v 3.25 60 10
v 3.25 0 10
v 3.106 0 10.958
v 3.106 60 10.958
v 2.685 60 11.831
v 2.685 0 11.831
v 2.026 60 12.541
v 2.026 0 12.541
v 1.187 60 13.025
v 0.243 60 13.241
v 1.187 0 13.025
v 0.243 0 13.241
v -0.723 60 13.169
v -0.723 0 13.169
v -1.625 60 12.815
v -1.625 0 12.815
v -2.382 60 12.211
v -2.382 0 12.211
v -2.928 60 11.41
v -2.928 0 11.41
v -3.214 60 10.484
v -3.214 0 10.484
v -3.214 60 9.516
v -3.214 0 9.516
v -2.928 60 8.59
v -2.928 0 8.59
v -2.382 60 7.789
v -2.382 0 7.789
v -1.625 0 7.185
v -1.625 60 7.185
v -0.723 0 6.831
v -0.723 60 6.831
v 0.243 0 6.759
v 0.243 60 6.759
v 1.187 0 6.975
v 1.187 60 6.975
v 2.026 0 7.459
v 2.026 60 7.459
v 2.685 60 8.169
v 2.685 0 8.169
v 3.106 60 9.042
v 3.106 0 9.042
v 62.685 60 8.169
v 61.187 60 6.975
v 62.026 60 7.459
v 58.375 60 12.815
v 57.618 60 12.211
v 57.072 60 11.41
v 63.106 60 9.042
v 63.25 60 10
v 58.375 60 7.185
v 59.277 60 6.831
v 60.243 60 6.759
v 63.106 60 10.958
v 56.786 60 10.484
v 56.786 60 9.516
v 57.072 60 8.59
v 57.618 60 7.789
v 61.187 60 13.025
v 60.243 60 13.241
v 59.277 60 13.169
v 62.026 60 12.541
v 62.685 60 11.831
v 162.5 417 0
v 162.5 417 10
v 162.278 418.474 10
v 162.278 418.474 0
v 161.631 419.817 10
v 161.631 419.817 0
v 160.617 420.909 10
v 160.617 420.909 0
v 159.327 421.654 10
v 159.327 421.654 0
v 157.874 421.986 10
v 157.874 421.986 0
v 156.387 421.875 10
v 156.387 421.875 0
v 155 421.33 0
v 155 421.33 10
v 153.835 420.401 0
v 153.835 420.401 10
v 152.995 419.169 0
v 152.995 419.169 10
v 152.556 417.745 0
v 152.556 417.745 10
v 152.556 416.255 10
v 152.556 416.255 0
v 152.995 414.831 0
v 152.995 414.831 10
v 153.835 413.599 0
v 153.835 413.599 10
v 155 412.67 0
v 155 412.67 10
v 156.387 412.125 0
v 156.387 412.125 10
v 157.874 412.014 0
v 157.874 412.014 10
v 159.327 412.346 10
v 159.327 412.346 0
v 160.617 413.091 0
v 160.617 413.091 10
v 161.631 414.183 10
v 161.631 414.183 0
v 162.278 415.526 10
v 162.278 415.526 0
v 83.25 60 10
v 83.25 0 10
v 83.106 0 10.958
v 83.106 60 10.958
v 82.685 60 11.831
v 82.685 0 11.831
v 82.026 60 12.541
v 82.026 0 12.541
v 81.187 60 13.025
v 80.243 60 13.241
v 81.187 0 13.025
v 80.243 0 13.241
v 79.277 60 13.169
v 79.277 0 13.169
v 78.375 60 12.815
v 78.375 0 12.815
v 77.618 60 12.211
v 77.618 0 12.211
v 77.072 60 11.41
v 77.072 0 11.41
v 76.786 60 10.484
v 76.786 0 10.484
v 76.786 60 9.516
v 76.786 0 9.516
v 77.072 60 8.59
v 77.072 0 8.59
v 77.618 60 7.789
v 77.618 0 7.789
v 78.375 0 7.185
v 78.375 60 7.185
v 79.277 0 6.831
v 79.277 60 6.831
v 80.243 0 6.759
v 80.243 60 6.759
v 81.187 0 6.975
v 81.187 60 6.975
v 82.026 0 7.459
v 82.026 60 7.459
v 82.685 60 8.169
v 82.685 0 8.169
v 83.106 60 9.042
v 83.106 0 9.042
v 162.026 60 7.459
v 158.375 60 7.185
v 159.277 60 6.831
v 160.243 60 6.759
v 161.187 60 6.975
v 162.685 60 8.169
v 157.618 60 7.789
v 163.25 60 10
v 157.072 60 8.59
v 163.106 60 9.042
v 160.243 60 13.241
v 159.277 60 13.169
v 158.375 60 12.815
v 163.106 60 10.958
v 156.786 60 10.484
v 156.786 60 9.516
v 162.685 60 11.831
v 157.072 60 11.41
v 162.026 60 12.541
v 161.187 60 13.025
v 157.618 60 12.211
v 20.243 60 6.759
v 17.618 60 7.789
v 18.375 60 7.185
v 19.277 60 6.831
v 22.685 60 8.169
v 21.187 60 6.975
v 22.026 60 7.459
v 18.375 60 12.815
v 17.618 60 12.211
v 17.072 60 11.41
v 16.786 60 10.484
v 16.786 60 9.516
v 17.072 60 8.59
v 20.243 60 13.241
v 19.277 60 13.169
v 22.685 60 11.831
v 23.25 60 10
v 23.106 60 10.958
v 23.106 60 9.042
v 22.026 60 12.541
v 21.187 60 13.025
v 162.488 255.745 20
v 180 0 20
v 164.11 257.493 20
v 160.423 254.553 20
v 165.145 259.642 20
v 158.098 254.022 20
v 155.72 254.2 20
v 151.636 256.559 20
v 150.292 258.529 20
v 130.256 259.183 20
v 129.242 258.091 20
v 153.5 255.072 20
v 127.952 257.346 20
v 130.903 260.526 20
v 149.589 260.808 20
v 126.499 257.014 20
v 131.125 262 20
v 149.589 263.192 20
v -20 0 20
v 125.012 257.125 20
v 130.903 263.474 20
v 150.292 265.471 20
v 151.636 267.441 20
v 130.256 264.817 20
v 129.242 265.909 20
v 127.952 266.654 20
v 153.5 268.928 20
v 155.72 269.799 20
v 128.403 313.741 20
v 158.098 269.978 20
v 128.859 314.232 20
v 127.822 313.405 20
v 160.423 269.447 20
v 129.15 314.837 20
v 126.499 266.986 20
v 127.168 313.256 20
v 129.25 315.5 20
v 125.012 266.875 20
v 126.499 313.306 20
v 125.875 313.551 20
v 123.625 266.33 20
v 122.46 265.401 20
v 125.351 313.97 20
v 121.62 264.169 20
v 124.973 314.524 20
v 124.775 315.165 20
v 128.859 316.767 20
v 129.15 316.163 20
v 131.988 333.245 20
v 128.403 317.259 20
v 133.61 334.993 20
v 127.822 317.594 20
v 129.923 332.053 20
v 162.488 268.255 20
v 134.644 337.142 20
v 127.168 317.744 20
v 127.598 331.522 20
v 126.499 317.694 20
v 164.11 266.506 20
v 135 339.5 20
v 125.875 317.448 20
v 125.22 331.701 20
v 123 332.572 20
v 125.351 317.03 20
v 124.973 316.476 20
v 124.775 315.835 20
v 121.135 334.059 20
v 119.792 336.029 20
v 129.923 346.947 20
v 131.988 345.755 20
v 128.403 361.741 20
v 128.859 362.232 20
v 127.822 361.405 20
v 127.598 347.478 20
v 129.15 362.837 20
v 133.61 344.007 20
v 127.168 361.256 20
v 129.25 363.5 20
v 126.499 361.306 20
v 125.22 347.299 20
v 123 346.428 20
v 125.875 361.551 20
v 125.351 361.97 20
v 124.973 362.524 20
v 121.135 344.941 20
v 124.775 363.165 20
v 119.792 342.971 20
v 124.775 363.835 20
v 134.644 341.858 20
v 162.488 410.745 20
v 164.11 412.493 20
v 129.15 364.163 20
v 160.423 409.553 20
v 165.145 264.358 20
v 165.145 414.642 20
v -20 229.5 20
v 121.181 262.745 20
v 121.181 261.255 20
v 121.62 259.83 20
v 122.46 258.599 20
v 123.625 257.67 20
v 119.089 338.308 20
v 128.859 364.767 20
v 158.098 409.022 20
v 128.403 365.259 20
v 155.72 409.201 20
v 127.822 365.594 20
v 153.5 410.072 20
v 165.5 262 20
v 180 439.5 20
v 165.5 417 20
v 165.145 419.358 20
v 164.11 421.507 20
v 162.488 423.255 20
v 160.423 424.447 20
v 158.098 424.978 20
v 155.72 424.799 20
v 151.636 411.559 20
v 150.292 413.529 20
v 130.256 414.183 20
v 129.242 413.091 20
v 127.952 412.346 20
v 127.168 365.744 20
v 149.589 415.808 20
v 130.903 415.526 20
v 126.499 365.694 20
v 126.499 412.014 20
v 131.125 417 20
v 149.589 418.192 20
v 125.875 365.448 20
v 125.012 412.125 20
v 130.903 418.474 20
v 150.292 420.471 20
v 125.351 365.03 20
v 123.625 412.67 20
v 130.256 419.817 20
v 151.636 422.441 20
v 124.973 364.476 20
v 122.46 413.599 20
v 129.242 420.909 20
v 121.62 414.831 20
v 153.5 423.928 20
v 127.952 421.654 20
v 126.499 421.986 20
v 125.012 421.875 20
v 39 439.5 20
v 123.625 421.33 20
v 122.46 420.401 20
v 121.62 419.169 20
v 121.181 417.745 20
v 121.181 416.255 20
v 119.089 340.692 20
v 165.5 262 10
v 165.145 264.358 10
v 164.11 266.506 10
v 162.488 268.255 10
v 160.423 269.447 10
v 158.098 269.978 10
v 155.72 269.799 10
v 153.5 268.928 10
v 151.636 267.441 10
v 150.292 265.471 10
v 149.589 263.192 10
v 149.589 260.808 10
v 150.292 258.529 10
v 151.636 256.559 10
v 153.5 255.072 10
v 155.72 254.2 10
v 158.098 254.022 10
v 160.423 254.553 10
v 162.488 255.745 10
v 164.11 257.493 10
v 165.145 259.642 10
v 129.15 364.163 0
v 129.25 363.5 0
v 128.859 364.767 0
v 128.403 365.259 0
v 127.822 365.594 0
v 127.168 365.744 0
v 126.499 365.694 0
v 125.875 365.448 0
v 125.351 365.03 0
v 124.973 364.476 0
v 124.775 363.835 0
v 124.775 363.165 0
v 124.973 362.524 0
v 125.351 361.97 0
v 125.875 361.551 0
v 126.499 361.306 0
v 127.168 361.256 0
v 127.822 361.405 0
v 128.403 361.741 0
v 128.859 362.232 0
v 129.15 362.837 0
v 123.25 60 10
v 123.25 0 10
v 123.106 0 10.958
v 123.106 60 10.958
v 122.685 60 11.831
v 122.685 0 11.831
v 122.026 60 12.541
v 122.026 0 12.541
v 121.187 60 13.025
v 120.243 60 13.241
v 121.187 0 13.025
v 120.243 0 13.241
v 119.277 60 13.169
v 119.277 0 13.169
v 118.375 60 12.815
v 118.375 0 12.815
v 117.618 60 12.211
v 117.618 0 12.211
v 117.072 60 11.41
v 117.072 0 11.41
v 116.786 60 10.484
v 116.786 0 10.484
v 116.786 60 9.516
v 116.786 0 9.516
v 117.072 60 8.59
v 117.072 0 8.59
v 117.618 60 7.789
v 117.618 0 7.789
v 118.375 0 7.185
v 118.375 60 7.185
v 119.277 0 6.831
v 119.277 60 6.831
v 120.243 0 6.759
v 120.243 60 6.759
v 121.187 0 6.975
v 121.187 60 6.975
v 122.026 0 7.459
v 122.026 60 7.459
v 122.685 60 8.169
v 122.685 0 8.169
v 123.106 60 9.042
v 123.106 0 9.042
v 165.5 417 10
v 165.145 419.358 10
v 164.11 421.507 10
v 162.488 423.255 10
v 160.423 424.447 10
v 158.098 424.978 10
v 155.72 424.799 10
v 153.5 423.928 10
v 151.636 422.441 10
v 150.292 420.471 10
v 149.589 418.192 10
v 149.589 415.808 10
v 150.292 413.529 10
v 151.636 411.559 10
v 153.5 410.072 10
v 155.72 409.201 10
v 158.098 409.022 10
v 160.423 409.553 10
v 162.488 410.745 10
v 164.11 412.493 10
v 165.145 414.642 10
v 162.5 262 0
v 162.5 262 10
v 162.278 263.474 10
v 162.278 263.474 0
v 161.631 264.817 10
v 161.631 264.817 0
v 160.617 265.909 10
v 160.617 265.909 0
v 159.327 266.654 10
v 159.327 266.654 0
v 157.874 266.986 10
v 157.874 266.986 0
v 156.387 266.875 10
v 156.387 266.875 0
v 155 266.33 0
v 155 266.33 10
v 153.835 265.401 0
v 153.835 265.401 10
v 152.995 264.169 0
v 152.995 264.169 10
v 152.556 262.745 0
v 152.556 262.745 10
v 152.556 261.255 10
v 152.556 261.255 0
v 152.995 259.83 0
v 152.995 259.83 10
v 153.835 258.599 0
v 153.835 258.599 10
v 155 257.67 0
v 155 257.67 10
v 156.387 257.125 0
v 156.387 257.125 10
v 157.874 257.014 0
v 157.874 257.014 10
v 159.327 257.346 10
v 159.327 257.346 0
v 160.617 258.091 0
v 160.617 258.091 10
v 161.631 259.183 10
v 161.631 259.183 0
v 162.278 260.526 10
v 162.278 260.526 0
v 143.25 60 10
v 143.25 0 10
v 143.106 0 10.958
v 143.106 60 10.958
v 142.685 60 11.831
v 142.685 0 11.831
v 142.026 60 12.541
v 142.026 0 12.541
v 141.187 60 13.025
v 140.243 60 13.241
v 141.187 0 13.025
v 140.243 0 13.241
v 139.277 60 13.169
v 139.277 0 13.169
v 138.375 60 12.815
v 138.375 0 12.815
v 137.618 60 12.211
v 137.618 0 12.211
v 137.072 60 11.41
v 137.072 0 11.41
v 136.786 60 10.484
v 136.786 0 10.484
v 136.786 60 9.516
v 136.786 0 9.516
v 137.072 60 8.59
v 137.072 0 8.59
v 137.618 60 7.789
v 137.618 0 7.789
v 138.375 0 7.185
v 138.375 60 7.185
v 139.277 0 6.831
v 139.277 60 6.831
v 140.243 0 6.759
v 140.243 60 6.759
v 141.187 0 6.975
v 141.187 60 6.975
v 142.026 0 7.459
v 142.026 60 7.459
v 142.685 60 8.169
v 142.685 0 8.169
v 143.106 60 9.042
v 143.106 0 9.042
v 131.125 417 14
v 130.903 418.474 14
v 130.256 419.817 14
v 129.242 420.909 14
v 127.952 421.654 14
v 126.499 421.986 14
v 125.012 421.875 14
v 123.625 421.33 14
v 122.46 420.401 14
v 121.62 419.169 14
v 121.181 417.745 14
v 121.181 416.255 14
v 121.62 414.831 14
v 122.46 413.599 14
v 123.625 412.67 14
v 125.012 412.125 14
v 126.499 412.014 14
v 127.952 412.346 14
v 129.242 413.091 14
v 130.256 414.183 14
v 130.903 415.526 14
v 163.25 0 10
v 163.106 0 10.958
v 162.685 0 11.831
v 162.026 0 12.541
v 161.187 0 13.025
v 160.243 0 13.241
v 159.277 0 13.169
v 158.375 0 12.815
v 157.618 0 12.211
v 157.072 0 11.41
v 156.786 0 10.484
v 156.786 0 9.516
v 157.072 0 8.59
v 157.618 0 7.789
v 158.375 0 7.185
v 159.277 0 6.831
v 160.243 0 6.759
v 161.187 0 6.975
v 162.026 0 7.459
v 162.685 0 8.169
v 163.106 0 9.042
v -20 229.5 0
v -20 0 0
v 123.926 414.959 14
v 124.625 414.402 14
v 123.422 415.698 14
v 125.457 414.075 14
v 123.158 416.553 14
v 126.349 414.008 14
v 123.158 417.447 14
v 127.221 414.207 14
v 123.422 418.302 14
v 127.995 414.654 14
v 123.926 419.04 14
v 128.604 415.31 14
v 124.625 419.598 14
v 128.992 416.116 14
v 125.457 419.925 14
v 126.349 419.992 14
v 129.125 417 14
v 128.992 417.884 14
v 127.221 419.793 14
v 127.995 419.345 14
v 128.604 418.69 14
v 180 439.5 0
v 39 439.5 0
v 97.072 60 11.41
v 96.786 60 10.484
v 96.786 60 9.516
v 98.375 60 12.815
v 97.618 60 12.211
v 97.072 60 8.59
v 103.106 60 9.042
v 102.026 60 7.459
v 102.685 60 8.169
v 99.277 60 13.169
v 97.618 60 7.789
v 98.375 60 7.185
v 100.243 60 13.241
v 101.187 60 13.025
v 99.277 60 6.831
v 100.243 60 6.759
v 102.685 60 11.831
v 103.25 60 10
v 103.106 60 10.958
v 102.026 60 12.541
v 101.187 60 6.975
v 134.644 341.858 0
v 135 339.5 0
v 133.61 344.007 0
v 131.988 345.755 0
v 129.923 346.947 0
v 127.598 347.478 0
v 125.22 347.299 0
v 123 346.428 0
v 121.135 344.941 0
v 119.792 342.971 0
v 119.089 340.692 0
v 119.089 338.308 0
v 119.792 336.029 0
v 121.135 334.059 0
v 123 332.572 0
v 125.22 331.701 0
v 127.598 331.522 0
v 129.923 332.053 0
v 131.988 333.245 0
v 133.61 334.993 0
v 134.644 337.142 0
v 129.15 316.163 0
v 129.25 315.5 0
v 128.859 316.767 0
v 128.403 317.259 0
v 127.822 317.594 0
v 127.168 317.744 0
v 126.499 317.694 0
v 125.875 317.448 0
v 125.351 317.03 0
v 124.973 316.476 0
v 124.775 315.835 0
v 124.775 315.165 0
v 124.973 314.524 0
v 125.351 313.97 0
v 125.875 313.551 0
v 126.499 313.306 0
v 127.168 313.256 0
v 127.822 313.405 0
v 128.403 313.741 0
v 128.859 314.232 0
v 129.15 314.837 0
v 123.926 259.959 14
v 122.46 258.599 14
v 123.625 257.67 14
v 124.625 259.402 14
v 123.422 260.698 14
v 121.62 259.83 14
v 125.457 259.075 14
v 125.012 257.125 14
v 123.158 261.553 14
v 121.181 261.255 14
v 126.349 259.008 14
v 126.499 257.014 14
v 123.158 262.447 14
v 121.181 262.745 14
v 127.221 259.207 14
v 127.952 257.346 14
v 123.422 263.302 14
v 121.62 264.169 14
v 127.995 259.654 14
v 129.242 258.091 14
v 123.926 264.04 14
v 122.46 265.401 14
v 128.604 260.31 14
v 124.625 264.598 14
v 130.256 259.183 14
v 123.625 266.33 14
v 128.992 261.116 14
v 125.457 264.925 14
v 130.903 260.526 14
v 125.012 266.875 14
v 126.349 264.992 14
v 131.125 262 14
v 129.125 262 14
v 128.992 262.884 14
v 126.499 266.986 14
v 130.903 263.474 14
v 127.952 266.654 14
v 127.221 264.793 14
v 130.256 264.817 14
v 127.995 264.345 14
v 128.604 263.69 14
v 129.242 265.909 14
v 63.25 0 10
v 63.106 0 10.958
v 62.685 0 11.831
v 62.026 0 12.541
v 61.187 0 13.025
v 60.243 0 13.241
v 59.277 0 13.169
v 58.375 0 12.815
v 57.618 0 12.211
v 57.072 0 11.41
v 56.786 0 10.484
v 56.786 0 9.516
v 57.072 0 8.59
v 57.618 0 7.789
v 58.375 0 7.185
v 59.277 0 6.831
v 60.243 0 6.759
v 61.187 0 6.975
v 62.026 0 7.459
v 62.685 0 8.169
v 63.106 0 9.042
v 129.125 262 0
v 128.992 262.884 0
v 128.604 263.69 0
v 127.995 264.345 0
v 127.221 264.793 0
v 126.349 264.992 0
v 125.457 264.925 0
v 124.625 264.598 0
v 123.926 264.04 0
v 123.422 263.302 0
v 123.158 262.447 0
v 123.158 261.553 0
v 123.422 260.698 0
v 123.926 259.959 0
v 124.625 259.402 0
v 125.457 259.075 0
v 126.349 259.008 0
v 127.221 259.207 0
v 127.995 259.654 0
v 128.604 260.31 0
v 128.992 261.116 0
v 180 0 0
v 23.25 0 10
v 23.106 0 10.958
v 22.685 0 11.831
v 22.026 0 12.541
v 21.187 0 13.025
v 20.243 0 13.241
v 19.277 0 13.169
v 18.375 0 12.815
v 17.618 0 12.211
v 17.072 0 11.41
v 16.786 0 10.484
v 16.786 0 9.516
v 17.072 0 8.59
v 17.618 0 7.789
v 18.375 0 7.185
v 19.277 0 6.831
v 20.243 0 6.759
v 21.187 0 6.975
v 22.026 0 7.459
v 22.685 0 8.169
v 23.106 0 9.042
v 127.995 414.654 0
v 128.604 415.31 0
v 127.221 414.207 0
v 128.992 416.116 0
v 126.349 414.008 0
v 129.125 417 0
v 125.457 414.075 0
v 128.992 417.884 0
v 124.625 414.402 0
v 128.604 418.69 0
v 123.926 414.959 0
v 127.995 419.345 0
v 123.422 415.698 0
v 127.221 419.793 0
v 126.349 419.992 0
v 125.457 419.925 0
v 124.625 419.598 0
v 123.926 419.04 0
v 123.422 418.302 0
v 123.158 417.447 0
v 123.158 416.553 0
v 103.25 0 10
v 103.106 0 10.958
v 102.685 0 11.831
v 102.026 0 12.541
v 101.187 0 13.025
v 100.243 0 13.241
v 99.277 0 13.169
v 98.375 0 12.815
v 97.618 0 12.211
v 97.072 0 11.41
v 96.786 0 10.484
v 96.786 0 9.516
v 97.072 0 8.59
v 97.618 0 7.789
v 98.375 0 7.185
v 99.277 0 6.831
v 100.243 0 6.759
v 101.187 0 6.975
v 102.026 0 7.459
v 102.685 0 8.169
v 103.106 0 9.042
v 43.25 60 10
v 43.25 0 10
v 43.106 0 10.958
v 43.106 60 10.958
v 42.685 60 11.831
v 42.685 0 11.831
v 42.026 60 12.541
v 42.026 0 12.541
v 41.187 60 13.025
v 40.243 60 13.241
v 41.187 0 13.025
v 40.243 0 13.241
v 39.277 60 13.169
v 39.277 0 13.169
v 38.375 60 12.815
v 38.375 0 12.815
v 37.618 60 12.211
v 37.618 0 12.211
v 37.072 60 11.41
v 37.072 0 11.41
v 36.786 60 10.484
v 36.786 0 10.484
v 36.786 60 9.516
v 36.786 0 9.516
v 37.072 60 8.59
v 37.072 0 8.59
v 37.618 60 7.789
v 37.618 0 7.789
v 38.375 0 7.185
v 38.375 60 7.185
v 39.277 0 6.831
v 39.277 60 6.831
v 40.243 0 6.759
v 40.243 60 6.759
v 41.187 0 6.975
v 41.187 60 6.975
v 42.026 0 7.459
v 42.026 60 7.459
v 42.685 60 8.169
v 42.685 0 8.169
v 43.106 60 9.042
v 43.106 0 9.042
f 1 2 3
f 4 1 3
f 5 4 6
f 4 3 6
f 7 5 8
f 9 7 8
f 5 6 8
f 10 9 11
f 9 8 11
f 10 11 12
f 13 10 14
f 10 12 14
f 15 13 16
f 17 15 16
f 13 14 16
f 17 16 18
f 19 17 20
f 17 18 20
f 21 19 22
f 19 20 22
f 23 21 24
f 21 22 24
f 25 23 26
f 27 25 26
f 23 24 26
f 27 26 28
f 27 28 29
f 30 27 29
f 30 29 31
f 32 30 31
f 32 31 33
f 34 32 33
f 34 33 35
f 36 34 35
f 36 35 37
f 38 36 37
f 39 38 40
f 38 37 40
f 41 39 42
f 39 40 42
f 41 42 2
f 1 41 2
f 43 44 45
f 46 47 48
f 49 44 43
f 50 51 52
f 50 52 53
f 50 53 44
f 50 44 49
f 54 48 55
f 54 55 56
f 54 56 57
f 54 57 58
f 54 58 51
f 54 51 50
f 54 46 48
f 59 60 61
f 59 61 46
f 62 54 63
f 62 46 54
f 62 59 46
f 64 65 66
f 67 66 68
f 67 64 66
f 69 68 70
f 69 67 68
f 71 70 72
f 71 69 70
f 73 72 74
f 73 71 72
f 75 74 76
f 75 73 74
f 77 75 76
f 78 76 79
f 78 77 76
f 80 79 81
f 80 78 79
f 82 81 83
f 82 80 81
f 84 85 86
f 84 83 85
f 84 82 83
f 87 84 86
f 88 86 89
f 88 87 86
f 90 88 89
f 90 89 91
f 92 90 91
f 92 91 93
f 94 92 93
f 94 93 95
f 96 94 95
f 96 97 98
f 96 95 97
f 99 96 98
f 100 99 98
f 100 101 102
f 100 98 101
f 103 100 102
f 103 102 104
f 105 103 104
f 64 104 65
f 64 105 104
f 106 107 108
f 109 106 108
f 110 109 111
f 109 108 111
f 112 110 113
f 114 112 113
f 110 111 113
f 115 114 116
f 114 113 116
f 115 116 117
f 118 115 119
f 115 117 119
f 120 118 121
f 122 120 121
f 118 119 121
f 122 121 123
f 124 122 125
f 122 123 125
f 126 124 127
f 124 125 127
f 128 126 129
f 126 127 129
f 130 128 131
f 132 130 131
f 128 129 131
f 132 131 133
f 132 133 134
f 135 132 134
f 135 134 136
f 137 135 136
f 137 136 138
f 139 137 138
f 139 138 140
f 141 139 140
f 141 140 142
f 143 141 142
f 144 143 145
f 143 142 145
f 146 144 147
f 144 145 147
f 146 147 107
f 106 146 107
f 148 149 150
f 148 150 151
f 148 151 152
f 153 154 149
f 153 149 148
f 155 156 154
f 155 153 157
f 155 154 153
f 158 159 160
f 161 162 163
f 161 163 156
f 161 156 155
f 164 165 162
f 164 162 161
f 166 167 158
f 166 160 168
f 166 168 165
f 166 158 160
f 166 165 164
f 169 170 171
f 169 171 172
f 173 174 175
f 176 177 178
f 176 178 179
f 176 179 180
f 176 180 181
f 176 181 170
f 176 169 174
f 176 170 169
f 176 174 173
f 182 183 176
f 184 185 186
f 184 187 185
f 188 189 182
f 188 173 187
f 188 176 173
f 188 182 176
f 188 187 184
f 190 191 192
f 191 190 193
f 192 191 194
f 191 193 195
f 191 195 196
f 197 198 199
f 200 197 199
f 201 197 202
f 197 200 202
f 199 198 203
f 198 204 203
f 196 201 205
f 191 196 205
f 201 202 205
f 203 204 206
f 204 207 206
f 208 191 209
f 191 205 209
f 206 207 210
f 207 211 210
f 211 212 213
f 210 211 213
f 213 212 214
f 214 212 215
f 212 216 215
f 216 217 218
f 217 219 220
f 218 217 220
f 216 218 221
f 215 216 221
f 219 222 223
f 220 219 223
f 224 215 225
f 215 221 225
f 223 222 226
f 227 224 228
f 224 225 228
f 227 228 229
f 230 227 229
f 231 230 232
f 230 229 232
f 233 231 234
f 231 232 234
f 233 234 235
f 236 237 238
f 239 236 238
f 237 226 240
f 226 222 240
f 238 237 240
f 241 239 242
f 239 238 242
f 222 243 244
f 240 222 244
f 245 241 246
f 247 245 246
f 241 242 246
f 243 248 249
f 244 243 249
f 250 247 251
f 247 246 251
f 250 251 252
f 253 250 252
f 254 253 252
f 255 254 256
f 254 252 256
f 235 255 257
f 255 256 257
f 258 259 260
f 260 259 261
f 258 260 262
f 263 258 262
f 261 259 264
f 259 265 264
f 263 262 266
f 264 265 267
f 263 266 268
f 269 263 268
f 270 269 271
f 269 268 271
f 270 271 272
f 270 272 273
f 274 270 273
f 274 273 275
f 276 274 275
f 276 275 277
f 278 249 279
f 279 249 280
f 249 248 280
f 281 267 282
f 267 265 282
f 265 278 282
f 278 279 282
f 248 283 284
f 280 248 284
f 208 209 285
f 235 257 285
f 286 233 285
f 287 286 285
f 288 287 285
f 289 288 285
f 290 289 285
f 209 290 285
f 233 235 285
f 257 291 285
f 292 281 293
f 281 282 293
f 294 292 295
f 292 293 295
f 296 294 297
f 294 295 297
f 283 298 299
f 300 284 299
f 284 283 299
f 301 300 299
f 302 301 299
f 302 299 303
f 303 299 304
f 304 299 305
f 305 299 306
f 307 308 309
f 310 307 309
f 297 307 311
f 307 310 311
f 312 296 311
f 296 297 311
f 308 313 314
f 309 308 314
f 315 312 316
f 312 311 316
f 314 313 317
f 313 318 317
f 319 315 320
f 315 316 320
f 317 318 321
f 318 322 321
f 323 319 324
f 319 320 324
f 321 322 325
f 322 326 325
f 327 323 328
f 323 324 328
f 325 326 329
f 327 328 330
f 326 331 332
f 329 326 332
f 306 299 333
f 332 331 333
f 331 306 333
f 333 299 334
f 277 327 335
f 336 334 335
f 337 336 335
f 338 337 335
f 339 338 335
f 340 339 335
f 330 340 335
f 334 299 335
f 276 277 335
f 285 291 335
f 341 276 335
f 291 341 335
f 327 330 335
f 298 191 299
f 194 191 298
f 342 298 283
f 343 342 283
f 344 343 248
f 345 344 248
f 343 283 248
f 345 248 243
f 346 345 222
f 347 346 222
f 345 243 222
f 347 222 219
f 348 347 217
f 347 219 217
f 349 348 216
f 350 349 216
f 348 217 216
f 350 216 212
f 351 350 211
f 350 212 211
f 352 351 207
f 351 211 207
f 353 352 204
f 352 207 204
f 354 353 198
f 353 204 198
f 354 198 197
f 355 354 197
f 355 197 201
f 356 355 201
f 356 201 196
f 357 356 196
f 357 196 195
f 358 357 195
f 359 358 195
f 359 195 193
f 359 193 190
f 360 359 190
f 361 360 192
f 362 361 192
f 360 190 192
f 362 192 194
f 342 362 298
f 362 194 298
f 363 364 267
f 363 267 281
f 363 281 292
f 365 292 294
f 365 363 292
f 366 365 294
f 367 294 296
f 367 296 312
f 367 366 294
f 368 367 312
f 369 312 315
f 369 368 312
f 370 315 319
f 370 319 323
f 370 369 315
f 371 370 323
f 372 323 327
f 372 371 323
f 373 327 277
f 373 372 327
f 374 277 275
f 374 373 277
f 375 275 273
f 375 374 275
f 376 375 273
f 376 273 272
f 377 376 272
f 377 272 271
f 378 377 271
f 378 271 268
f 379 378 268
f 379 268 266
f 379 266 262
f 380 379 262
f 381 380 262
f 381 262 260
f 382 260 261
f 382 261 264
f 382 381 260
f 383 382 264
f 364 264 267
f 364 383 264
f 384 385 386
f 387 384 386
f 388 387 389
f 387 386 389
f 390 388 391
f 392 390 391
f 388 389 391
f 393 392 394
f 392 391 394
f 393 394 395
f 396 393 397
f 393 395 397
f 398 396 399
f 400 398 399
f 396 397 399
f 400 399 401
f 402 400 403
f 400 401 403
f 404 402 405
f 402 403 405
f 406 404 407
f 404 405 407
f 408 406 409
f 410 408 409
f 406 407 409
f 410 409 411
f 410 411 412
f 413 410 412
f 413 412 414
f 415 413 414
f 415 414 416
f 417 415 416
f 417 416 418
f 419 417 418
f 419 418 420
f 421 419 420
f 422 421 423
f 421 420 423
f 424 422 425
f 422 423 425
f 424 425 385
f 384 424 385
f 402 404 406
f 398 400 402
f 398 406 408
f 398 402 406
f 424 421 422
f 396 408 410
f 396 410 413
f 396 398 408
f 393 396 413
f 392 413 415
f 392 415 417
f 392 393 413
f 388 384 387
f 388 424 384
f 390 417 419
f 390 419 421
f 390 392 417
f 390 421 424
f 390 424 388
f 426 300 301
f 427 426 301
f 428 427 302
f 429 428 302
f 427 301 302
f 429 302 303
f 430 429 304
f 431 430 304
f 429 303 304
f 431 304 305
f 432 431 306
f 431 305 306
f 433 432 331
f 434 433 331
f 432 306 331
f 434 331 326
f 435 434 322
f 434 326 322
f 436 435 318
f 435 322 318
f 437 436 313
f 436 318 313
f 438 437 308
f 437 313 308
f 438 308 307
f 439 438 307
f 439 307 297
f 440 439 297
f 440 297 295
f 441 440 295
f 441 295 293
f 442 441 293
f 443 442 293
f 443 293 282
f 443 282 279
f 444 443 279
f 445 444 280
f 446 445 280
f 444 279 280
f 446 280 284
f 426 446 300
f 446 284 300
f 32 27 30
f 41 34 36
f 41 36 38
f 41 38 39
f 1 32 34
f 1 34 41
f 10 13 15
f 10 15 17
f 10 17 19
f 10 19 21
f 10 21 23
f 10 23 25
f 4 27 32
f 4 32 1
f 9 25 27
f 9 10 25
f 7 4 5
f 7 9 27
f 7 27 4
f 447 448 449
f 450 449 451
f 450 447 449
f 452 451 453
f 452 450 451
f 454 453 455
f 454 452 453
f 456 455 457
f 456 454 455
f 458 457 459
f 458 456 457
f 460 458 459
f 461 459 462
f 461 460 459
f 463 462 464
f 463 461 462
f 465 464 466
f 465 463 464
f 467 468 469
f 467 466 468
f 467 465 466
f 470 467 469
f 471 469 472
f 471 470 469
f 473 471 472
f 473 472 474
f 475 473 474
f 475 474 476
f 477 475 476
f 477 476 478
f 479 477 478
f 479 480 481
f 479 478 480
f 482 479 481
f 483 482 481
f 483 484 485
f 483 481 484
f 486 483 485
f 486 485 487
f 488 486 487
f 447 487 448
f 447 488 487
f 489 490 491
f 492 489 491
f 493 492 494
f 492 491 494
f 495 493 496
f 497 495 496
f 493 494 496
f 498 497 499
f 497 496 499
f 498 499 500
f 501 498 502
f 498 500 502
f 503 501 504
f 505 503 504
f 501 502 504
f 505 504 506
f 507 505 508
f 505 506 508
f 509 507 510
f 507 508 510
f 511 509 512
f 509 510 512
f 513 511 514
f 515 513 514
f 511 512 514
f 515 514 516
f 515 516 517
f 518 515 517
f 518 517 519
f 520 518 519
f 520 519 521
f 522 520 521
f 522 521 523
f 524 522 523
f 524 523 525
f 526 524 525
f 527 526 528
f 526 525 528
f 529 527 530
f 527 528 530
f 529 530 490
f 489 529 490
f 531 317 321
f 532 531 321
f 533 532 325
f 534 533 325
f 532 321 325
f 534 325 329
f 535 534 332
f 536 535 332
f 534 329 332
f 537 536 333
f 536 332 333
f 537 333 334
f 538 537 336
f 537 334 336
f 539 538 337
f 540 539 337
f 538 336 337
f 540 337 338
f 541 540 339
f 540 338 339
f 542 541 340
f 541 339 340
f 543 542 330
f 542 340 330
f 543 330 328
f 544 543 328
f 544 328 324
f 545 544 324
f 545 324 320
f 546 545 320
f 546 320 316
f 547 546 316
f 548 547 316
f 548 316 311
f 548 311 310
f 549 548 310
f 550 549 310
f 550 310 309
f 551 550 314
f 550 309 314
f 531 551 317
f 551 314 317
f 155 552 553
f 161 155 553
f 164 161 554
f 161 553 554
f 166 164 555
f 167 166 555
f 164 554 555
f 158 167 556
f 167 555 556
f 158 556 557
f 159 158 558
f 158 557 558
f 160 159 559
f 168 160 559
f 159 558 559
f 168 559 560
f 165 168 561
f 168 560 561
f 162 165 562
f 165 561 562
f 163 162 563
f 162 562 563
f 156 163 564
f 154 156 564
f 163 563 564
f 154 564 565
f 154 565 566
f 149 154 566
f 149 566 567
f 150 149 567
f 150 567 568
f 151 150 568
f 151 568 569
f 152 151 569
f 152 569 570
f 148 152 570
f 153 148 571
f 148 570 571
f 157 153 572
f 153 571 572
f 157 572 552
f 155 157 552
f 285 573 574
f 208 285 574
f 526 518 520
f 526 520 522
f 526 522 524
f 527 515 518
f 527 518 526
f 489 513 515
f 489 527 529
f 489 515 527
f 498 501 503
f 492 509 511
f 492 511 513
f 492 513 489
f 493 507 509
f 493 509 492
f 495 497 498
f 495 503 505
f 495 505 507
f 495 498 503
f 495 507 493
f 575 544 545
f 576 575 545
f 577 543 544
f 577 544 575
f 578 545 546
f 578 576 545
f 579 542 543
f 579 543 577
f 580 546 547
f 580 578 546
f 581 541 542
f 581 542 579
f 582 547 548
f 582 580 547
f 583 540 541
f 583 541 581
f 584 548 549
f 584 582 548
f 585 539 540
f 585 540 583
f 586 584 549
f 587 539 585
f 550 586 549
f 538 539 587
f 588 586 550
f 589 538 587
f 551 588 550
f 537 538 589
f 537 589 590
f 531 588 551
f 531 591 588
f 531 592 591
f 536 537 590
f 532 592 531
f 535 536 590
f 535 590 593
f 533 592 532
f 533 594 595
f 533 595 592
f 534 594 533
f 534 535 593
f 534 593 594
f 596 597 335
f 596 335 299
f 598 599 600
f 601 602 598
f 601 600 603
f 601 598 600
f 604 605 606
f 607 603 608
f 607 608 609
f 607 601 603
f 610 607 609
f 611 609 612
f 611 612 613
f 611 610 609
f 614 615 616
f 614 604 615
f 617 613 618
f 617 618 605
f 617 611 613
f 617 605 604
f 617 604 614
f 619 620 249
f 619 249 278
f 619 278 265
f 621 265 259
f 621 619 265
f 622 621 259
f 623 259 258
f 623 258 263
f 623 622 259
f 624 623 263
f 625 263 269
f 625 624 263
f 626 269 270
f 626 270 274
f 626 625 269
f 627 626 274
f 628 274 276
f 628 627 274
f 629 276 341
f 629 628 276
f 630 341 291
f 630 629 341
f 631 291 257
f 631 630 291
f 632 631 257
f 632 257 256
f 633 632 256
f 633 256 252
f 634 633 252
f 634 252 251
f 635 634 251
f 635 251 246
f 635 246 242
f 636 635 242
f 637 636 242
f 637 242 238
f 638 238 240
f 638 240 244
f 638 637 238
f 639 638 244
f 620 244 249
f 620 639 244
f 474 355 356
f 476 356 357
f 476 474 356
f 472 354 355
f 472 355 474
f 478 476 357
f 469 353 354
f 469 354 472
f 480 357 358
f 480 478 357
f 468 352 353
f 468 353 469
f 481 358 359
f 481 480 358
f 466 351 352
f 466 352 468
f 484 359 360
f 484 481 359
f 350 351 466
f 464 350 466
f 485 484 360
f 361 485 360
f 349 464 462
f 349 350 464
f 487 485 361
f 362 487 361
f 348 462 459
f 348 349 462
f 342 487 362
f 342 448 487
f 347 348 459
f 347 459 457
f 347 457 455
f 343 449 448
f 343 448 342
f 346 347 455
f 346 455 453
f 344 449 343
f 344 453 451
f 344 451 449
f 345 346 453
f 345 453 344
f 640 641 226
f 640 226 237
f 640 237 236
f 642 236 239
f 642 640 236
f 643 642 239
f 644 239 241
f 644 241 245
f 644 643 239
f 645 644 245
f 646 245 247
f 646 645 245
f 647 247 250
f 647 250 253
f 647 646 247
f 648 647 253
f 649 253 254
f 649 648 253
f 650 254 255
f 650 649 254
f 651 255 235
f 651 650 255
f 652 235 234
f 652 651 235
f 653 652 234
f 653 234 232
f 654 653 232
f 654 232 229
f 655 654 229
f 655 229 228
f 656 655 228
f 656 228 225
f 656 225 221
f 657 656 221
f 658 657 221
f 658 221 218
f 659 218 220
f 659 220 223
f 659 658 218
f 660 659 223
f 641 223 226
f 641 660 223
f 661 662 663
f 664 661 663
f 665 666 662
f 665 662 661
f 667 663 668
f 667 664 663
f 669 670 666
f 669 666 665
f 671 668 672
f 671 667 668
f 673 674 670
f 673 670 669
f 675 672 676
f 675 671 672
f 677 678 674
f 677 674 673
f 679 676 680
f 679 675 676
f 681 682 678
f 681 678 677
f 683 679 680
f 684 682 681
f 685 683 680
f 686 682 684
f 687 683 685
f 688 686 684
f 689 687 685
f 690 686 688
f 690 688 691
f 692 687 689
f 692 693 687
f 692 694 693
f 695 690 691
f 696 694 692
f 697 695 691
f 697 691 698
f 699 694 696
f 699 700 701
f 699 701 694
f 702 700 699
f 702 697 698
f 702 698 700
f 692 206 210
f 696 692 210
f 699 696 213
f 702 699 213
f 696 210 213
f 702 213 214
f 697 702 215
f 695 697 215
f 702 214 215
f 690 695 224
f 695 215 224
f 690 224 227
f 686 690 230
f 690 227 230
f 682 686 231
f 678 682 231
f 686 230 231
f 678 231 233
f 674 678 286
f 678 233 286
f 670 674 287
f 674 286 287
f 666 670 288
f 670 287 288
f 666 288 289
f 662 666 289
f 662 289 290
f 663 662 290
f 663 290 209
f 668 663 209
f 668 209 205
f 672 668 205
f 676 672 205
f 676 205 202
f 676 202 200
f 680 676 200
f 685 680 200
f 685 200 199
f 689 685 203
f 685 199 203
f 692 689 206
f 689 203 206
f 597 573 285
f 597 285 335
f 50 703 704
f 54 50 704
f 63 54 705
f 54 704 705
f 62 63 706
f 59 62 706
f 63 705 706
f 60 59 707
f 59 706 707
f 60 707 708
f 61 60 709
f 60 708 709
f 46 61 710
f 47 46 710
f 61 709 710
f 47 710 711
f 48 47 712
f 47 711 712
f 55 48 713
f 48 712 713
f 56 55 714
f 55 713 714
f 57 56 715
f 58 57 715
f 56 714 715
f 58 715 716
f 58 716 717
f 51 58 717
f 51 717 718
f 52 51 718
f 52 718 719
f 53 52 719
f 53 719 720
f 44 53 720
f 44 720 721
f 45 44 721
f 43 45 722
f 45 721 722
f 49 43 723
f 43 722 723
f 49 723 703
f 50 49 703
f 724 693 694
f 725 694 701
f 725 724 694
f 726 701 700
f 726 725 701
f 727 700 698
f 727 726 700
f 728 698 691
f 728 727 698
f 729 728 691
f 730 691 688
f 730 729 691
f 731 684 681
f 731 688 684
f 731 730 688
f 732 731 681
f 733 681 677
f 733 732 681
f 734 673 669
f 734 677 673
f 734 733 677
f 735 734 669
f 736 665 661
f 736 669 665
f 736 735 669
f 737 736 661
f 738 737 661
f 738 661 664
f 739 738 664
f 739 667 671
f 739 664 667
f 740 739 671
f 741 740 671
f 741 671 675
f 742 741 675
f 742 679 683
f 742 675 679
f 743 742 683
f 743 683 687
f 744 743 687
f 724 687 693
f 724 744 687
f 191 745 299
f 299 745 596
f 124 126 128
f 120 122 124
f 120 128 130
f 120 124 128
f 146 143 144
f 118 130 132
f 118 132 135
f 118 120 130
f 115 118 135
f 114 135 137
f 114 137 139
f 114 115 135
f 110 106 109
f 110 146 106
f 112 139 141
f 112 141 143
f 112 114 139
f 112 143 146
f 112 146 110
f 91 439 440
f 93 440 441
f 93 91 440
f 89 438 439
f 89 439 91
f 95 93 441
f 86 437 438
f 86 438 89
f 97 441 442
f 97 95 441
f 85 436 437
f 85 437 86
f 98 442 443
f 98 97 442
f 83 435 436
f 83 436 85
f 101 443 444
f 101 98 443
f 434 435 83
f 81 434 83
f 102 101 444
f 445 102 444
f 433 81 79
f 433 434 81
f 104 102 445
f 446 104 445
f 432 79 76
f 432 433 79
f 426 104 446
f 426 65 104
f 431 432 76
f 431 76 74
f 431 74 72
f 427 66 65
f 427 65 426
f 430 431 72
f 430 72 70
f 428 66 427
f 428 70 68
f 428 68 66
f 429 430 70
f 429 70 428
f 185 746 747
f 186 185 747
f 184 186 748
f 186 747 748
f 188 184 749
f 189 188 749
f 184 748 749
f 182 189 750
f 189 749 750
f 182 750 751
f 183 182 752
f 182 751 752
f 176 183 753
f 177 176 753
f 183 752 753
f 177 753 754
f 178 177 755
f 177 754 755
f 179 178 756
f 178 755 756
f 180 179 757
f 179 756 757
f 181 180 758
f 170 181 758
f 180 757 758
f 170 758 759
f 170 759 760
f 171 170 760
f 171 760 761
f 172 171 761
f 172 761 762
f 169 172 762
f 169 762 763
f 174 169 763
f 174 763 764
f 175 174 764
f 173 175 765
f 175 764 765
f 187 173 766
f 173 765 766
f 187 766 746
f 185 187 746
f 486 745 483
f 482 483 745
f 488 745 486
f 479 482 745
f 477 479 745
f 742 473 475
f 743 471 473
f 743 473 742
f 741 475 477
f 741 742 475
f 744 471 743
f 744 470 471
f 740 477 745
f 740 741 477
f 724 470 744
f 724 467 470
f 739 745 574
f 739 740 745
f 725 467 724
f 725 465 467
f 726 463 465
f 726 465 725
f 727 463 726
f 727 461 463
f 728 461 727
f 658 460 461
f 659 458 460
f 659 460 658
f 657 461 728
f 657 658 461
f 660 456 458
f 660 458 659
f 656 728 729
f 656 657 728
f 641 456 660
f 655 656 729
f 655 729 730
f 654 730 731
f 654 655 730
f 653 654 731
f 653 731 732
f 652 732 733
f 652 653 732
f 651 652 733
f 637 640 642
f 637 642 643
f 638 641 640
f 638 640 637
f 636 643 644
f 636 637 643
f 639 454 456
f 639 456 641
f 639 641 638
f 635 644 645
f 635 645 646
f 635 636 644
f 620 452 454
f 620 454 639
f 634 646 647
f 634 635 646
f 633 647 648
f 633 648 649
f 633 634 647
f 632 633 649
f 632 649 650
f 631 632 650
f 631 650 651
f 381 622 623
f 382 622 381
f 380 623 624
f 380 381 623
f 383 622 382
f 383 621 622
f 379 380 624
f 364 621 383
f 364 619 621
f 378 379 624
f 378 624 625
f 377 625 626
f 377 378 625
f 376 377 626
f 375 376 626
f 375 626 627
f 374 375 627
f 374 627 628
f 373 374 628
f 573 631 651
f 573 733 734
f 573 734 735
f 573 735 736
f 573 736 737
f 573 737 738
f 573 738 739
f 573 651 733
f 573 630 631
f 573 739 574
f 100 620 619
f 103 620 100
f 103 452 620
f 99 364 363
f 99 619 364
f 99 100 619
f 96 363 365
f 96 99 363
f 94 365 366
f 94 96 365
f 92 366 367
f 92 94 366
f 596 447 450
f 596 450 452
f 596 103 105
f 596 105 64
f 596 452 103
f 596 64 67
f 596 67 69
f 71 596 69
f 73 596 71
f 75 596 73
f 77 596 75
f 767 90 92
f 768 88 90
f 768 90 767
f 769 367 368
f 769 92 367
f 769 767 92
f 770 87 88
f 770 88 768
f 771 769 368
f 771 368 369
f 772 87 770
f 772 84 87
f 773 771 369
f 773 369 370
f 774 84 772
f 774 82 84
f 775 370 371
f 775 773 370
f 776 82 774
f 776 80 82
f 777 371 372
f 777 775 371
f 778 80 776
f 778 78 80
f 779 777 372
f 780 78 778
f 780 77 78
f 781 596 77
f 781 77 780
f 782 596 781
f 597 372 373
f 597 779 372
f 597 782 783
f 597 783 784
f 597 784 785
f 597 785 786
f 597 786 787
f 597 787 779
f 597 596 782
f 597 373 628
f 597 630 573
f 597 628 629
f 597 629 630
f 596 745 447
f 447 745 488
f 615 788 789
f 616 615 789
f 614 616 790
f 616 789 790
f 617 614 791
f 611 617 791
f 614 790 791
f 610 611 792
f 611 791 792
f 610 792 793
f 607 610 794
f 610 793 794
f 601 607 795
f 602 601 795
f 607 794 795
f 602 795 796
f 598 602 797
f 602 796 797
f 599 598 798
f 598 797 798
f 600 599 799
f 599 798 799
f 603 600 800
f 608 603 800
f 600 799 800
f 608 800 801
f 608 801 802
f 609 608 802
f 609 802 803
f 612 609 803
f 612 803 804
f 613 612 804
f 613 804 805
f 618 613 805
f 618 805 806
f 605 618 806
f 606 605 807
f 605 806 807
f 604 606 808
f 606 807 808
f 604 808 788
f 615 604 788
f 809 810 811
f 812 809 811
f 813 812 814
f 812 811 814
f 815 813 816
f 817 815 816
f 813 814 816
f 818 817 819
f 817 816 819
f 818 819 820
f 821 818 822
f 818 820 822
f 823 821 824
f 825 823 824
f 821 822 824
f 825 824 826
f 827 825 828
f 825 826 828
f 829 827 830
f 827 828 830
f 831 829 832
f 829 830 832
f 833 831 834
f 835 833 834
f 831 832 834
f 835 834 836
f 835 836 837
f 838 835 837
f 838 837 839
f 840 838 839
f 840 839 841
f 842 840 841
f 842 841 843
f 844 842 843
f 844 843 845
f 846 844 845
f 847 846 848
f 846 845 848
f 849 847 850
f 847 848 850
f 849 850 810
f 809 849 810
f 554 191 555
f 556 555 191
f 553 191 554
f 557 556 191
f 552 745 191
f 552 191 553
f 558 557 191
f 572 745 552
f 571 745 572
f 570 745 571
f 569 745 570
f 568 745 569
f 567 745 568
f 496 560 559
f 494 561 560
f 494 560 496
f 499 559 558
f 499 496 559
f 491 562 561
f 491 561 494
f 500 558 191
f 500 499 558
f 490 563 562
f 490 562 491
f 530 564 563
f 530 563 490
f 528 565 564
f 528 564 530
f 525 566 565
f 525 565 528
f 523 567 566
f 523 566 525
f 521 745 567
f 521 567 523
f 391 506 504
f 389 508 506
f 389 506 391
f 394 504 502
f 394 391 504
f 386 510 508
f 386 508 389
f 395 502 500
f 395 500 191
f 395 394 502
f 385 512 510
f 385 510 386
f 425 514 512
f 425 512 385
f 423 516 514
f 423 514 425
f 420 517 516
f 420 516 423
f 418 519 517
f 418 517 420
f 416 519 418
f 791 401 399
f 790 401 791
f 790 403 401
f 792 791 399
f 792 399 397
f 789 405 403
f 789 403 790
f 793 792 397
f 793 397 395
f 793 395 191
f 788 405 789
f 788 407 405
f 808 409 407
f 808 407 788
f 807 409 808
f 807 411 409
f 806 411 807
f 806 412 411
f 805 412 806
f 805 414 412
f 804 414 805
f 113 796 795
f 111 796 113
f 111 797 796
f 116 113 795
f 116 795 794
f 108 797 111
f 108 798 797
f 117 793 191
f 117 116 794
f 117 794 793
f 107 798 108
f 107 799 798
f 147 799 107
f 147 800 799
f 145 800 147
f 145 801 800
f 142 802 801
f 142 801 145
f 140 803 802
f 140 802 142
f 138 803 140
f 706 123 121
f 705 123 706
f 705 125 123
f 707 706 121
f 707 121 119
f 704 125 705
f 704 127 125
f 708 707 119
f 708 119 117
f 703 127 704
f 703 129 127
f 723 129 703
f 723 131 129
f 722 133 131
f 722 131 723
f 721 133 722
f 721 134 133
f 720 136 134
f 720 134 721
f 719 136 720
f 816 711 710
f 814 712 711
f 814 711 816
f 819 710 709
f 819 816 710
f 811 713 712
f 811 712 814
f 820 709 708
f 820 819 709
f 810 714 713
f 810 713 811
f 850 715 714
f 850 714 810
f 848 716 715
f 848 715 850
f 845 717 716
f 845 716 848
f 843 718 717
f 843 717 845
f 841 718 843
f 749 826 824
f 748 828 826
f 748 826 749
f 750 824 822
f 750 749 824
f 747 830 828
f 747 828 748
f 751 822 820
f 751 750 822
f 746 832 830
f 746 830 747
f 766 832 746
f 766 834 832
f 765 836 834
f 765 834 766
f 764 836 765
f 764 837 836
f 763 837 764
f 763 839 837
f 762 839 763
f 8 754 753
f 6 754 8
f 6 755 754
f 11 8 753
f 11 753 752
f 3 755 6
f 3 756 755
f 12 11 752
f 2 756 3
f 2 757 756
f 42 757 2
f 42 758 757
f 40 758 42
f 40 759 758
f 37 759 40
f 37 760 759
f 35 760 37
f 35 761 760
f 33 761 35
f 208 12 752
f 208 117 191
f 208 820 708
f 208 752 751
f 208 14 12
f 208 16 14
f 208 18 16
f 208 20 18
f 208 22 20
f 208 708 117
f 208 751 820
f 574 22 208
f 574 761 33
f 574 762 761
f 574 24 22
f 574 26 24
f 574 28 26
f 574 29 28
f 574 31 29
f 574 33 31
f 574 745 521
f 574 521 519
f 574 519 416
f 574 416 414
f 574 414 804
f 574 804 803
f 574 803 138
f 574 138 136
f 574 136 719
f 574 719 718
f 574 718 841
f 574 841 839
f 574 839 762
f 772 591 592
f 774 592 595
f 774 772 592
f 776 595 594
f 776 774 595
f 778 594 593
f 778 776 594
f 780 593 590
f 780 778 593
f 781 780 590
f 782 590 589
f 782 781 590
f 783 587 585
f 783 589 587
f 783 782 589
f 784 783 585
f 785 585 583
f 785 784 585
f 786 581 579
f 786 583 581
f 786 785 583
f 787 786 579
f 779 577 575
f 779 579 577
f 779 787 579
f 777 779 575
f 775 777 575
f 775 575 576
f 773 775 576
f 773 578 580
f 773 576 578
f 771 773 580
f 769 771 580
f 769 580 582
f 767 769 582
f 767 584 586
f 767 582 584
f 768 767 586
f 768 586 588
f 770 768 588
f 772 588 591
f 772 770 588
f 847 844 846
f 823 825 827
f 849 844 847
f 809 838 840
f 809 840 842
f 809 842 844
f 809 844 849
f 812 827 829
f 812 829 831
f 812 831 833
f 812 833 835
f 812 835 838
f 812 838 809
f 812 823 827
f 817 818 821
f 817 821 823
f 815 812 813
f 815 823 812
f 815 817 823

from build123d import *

# Parameters (mm, degrees)
SKETCH1_R          = 8
SKETCH1_R_2        = 5
SKETCH1_R_3        = 2.25
SKETCH1_R_4        = 3
EXTRUDE1_DEPTH     = 20
SKETCH3_R          = 8
CUT_EXTRUDE2_DEPTH = 10
SKETCH4_R          = 3.25
CUT_EXTRUDE3_DEPTH = 60
SKETCH5_R          = 5
CUT_EXTRUDE4_DEPTH = 6


with BuildPart() as part:
    # Sketch1 → Extrude1 (new body)
    with BuildSketch(Plane.XY):
        Polygon((-20, 229.5), (38.999908, 439.49994136), (180, 439.50001453), (180, 30), (180, 0), (-20, 0), (-20, 30), align=None)
        with Locations((126.999908, 339.49994136)):
            Circle(SKETCH1_R, mode=Mode.SUBTRACT)
        with Locations((157.49992067, 416.99997068)):
            Circle(SKETCH1_R_2, mode=Mode.SUBTRACT)
        with Locations((126.999908, 363.49994136)):
            Circle(SKETCH1_R_3, mode=Mode.SUBTRACT)
        with Locations((126.999908, 315.49994136)):
            Circle(SKETCH1_R_3, mode=Mode.SUBTRACT)
        with Locations((157.49992067, 261.99991204)):
            Circle(SKETCH1_R_2, mode=Mode.SUBTRACT)
        with Locations((126.12492067, 261.99991204)):
            Circle(SKETCH1_R_4, mode=Mode.SUBTRACT)
        with Locations((126.12492067, 416.99997068)):
            Circle(SKETCH1_R_4, mode=Mode.SUBTRACT)
    extrude(amount=EXTRUDE1_DEPTH)

    # Sketch3 → Cut-Extrude2 (cut)
    with BuildSketch(Plane.XY.offset(20)):
        with Locations((157.49992067, 416.99997068)):
            Circle(SKETCH3_R)
        with Locations((157.49992067, 261.99991204)):
            Circle(SKETCH3_R)
    extrude(amount=-CUT_EXTRUDE2_DEPTH, mode=Mode.SUBTRACT)

    # Sketch4 → Cut-Extrude3 (cut)
    with BuildSketch(Plane.XZ):
        with Locations((20, 10)):
            Circle(SKETCH4_R)
        with Locations((40, 10)):
            Circle(SKETCH4_R)
        with Locations((60, 10)):
            Circle(SKETCH4_R)
        with Locations((80, 10)):
            Circle(SKETCH4_R)
        with Locations((100, 10)):
            Circle(SKETCH4_R)
        with Locations((120, 10)):
            Circle(SKETCH4_R)
        with Locations((140, 10)):
            Circle(SKETCH4_R)
        with Locations((160, 10)):
            Circle(SKETCH4_R)
        with Locations((0, 10)):
            Circle(SKETCH4_R)
    extrude(amount=-CUT_EXTRUDE3_DEPTH, mode=Mode.SUBTRACT)

    # Sketch5 → Cut-Extrude4 (cut)
    with BuildSketch(Plane.XY.offset(20)):
        with Locations((126.12492067, 416.99997068)):
            Circle(SKETCH5_R)
        with Locations((126.12492067, 261.99991204)):
            Circle(SKETCH5_R)
    extrude(amount=-CUT_EXTRUDE4_DEPTH, mode=Mode.SUBTRACT)


solid = part.part
